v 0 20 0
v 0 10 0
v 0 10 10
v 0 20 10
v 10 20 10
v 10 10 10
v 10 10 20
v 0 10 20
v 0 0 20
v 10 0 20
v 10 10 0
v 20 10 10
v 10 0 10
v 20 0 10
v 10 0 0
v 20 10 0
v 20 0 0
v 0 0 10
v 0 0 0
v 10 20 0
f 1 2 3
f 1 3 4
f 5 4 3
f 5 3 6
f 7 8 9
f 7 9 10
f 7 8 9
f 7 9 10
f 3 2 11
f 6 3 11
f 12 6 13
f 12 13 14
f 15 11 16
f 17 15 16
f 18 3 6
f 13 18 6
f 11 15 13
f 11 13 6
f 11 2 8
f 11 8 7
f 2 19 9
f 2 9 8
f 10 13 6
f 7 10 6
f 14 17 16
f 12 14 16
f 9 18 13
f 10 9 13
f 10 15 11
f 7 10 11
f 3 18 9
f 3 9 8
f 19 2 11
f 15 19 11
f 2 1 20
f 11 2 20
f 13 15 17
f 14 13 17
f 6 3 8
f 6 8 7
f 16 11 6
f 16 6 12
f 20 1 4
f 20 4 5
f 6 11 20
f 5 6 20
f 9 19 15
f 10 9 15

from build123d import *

# Parameters (mm, degrees)
BOX_W        = 10
BOX_H        = 10
BOX_DEPTH    = 10
BOX001_W     = 10
BOX001_H     = 10
BOX001_DEPTH = 10
BOX002_W     = 10
BOX002_H     = 10
BOX002_DEPTH = 10
BOX003_W     = 10
BOX003_H     = 10
BOX003_DEPTH = 20


with BuildPart() as level1_cube1:
    # Box → Box (new body)
    with BuildSketch(Plane.XY.offset(10)):
        with Locations((5, 5)):
            Rectangle(BOX_W, BOX_H)
    extrude(amount=BOX_DEPTH)


with BuildPart() as level2_cube1:
    # Box001 → Box001 (new body)
    with BuildSketch(Plane(origin=(10, 0, 0), x_dir=(1, 0, 0), z_dir=(0, 0, 1))):
        with Locations((5, 5)):
            Rectangle(BOX001_W, BOX001_H)
    extrude(amount=BOX001_DEPTH)


with BuildPart() as level2_cube2:
    # Box002 → Box002 (new body)
    with BuildSketch(Plane(origin=(0, 10, 0), x_dir=(1, 0, 0), z_dir=(0, 0, 1))):
        with Locations((5, 5)):
            Rectangle(BOX002_W, BOX002_H)
    extrude(amount=BOX002_DEPTH)


with BuildPart() as level2_cube3:
    # Box003 → Box003 (new body)
    with BuildSketch(Plane.XY):
        with Locations((5, 5)):
            Rectangle(BOX003_W, BOX003_H)
    extrude(amount=BOX003_DEPTH)


solid = Compound([level1_cube1.part, level2_cube1.part, level2_cube2.part, level2_cube3.part])
